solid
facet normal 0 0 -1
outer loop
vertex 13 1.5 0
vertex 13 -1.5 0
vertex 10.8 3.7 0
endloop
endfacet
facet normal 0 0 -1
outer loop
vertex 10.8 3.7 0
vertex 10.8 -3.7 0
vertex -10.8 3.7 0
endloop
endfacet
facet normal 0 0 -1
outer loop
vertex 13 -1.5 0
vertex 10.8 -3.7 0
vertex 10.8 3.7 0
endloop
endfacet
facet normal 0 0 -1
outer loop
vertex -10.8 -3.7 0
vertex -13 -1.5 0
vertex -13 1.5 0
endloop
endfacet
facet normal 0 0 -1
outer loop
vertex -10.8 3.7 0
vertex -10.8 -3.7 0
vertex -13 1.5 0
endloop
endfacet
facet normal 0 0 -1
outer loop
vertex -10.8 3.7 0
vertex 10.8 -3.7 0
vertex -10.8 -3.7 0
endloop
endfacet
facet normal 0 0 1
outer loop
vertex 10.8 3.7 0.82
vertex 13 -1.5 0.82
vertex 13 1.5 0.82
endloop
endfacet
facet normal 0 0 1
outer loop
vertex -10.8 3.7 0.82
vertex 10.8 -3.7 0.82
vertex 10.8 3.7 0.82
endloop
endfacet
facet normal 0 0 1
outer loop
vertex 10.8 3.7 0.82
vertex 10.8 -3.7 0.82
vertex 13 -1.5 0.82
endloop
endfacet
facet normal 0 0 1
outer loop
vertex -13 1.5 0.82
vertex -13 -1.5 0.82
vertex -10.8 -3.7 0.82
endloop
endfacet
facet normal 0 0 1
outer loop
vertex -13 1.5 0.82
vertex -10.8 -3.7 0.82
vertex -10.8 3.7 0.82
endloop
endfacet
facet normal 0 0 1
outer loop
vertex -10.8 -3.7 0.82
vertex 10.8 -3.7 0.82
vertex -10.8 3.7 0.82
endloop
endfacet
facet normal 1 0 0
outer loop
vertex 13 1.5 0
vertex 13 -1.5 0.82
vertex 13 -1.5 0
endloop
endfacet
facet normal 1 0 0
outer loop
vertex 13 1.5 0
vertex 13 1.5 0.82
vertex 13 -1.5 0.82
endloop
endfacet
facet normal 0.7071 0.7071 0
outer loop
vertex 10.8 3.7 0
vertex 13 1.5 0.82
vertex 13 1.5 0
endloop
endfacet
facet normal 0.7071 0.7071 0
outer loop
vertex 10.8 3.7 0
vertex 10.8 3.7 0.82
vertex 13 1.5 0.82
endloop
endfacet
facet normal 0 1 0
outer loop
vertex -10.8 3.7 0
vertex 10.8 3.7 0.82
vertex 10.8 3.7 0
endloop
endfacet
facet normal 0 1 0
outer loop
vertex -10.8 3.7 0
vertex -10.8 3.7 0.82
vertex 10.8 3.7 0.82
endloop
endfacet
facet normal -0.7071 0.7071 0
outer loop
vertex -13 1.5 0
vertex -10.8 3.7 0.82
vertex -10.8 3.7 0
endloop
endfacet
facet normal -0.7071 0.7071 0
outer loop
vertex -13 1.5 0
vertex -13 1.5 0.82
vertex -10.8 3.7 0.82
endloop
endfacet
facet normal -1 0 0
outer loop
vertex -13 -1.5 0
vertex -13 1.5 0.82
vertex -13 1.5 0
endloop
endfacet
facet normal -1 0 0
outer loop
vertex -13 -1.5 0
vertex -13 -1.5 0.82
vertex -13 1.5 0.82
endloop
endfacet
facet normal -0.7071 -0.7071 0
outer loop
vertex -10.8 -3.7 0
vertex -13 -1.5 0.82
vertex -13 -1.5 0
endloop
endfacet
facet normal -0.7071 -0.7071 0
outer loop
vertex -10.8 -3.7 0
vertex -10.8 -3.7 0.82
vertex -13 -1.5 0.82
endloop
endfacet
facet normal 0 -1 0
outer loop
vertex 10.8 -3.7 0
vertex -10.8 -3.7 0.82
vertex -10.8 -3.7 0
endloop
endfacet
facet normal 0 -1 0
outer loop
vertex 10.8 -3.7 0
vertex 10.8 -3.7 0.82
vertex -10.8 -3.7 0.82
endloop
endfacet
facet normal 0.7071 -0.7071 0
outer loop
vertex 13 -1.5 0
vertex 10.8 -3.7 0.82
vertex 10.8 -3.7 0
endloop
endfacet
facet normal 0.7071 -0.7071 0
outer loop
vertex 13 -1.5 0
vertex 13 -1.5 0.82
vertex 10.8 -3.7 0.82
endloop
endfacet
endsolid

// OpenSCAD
$fn=50;

cntrDia=14;
bWdth=3;
bLen=34;

pWdth=7.4;
pLen=26;
pThck=0.82;

%translate([-18.6,-7.1]) import("NeuroPort.svg");
!plate();

module plate(){
  pWngWdth=(pWdth-bWdth)/2;
  poly=[[-pLen/2,bWdth/2],[-pLen/2+pWngWdth,pWngWdth+bWdth/2],[pLen/2-pWngWdth,pWngWdth+bWdth/2],[pLen/2,bWdth/2],
        [pLen/2,-bWdth/2],[pLen/2-pWngWdth,-(pWngWdth+bWdth/2)],[-(pLen/2-pWngWdth),-(pWngWdth+bWdth/2)],[-pLen/2,-bWdth/2]];
  linear_extrude(pThck) polygon(poly);  
}

module buckle(){
  
}

difference(){
  union(){
    circle(d=cntrDia);
    translate([-1.6,0,0]) square([bLen,bWdth],true);
  }
  circle(r=1.6);
}
